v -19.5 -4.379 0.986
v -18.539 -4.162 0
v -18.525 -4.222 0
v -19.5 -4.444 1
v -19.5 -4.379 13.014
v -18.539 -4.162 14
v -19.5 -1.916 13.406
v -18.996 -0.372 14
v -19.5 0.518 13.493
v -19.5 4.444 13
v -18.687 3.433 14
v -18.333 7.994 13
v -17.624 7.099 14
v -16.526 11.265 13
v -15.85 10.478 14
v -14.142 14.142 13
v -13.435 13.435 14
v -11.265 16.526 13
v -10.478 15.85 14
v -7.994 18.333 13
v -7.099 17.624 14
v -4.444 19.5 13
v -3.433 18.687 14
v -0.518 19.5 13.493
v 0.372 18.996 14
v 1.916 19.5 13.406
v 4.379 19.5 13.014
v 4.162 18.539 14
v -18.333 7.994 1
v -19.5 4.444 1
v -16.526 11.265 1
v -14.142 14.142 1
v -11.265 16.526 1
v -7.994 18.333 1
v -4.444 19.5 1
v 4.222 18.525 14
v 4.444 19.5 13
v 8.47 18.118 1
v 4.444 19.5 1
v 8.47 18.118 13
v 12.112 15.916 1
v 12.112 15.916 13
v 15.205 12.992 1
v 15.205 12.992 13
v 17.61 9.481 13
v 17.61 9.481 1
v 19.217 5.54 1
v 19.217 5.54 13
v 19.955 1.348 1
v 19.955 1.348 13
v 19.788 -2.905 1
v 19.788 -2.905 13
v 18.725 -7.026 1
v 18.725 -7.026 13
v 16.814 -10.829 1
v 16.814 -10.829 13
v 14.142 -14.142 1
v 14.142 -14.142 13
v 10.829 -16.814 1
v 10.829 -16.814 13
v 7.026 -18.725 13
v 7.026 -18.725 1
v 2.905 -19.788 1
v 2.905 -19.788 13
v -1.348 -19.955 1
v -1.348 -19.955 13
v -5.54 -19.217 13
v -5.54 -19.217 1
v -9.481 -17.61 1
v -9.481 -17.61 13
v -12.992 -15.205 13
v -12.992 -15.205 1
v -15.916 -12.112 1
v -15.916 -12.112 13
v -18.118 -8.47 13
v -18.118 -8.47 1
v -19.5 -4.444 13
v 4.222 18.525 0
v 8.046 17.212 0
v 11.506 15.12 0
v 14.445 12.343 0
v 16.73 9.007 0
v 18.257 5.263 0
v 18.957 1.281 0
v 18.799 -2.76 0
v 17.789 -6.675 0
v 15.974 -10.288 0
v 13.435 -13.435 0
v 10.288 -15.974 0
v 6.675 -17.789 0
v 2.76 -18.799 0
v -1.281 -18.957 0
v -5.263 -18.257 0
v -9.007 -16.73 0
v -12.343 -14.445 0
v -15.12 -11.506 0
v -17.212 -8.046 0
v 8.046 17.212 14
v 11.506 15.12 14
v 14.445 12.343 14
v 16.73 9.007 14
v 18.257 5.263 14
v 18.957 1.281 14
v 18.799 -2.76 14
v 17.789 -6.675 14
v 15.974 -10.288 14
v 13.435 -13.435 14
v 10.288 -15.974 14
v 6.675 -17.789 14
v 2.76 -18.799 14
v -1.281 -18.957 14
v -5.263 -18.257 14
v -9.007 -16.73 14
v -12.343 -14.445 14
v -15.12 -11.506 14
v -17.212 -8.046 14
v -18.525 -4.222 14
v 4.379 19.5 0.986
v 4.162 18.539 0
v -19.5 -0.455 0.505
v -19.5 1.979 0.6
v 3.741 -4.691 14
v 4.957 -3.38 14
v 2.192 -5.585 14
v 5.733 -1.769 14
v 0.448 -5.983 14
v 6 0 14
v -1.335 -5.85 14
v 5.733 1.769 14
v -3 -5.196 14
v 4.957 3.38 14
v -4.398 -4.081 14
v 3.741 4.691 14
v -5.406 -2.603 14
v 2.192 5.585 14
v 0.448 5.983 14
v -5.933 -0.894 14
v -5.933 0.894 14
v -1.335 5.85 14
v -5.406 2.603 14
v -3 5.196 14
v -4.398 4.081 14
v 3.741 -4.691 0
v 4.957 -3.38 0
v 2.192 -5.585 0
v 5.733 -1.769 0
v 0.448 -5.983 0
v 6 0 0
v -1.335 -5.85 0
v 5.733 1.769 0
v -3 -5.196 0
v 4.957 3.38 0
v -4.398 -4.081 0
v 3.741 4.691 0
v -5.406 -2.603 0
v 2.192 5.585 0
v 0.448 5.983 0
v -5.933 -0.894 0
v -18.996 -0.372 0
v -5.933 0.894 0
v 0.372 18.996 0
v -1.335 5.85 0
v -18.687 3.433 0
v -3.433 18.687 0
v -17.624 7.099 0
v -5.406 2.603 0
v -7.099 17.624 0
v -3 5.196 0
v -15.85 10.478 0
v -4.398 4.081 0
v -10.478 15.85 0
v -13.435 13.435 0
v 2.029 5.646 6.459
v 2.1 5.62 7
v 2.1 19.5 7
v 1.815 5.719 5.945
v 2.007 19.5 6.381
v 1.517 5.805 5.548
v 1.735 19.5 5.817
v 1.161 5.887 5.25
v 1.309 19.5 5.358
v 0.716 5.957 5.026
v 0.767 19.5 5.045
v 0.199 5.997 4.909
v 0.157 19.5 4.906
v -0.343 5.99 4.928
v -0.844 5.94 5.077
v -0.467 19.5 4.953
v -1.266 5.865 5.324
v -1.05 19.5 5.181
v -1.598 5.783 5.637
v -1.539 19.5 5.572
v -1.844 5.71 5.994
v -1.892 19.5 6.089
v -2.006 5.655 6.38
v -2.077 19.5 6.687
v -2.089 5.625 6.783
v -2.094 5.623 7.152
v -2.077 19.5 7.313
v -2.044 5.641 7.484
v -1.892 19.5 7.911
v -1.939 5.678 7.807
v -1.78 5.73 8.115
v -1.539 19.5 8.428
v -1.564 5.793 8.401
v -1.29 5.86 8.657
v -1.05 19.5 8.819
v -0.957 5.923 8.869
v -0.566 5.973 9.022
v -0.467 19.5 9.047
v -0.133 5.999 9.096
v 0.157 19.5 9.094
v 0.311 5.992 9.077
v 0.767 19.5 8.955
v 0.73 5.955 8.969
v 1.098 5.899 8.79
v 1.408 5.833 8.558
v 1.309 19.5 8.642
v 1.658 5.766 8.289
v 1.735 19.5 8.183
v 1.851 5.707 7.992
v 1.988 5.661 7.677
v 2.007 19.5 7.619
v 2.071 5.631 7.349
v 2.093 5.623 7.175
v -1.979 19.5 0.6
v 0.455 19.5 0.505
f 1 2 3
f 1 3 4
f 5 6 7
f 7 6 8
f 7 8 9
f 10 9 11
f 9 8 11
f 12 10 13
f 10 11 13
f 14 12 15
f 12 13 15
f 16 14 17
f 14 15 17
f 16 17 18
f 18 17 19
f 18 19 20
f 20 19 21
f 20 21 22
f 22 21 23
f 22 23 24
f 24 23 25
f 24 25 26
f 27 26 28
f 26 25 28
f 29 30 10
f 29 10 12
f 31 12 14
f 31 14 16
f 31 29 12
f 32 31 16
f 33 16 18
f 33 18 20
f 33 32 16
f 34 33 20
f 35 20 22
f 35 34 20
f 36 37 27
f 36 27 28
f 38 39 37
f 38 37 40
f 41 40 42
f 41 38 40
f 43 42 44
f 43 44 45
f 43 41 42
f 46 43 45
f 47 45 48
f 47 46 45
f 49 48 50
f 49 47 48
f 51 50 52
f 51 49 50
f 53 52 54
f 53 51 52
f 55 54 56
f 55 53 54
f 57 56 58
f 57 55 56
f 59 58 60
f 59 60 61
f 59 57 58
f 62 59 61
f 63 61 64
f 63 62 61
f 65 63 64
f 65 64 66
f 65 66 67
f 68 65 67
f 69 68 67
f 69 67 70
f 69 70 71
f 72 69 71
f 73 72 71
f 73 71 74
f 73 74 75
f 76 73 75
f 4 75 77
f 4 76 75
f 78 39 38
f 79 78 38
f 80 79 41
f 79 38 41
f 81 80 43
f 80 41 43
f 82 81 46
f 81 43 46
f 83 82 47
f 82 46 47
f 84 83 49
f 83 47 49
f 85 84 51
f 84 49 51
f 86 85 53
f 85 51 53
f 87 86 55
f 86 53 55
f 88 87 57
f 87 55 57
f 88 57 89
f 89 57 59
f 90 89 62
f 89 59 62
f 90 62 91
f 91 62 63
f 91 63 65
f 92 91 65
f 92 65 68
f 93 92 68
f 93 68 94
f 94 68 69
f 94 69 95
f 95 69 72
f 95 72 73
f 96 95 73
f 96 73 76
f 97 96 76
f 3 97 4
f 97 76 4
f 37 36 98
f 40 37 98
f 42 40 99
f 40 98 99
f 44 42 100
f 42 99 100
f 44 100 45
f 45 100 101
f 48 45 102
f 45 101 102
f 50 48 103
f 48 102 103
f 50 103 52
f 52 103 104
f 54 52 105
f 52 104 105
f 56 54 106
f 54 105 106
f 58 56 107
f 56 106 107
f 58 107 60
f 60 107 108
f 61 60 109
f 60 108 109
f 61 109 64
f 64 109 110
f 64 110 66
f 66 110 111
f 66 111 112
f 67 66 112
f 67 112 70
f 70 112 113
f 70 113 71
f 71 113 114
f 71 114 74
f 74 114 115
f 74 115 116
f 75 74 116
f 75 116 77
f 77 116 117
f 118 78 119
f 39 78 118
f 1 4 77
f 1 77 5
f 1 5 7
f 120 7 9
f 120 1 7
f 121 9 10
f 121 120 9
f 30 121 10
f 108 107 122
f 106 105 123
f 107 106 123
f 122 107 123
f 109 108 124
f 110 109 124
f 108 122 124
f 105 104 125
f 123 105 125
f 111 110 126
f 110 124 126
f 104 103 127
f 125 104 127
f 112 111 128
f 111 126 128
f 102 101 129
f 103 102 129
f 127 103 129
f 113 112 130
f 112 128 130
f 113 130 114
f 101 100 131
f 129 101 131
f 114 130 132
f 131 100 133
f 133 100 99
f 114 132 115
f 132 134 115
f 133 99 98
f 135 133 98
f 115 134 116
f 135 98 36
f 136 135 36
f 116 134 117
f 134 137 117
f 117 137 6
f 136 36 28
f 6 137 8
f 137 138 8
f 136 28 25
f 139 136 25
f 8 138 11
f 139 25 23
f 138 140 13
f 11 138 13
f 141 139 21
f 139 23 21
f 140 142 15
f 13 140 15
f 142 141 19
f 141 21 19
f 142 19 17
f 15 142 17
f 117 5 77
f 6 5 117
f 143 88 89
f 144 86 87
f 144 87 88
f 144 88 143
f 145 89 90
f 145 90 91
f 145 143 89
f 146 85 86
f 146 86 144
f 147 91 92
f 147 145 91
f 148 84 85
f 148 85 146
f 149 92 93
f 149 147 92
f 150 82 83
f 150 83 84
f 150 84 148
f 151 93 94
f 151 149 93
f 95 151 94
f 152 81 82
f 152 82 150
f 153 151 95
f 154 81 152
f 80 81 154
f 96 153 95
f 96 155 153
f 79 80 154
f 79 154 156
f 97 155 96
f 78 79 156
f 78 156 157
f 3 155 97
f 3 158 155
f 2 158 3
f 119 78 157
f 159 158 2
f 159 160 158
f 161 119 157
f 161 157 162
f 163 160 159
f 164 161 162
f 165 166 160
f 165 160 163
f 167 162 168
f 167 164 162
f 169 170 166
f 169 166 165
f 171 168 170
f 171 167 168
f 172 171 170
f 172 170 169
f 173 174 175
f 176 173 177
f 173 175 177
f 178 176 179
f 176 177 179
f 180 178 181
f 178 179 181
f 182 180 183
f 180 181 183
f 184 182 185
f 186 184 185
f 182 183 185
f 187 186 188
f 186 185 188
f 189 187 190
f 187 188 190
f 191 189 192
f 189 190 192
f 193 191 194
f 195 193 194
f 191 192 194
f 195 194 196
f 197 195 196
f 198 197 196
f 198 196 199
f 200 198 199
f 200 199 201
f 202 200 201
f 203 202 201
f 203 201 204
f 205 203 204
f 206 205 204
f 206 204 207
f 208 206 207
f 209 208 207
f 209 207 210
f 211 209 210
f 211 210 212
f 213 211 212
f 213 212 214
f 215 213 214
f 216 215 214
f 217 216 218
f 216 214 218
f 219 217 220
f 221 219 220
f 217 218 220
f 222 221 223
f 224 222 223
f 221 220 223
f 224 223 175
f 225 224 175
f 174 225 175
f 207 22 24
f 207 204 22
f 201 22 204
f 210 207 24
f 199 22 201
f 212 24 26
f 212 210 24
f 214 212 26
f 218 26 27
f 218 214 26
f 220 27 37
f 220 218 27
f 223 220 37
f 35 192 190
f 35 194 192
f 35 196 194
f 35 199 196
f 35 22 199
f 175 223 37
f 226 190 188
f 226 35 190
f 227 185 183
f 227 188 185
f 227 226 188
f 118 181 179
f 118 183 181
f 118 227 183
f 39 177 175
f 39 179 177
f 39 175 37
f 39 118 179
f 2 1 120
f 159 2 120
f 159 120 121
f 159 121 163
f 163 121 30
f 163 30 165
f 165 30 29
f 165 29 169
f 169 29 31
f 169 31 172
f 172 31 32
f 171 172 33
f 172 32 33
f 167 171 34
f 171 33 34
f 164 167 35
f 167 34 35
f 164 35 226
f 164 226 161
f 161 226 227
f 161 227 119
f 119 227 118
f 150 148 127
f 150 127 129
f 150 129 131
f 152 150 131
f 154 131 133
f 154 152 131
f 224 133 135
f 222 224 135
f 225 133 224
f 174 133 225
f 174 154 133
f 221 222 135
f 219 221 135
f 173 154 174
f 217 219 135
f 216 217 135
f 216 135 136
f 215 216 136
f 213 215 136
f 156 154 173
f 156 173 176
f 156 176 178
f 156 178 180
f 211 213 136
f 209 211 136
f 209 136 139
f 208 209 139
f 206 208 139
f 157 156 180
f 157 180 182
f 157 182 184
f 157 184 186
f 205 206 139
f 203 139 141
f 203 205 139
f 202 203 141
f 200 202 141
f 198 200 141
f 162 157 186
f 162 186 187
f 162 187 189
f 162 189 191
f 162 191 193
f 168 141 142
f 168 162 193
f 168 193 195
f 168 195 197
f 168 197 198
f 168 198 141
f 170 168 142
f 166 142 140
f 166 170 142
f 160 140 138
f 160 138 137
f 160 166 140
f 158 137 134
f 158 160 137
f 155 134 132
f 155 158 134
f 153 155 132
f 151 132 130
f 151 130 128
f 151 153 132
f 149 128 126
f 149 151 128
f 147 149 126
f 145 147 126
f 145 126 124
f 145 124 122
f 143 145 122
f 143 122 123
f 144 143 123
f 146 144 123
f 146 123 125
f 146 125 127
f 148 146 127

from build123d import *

# Parameters (mm, degrees)
SKETCH1_R              = 6
BOSS_EXTRUDE1_DEPTH    = 14
M5_TAPPED_HOLE1_REACH  = 48.435
M5_TAPPED_HOLE1_BORE_R = 2.1
CHAMFER1_SIZE          = 1


with BuildPart() as part:
    # Sketch1 → Boss-Extrude1 (new body)
    with BuildSketch(Plane.XY):
        with BuildLine():
            Line((-4.444097209, 19.5), (4.444097209, 19.5))
            ThreePointArc((4.444097209, 19.5), (14.142135624, -14.142135624), (-19.5, -4.444097209))
            Line((-19.5, -4.444097209), (-19.5, 4.444097209))
            ThreePointArc((-19.5, 4.444097209), (-14.142135624, 14.142135624), (-4.444097209, 19.5))
        make_face()
        Circle(SKETCH1_R, mode=Mode.SUBTRACT)
    extrude(amount=BOSS_EXTRUDE1_DEPTH)

    # M5 Tapped Hole1 bore → M5 Tapped Hole1 (cut, up to next)
    with BuildSketch(Plane(origin=(0, 19.5, 0), x_dir=(1, 0, 0), z_dir=(0, 1, 0)), mode=Mode.PRIVATE) as m5_tapped_hole1_sk1:
        with Locations((0, -7)):
            Circle(M5_TAPPED_HOLE1_BORE_R)
    m5_tapped_hole1_tool1 = extrude(m5_tapped_hole1_sk1.sketch, amount=-M5_TAPPED_HOLE1_REACH, mode=Mode.PRIVATE) & part.part
    add(m5_tapped_hole1_tool1.solids().sort_by_distance((0, 19.5, 7))[0], mode=Mode.SUBTRACT)

    # Chamfer1
    chamfer1_edges = [part.edges().sort_by_distance(p)[0] for p in [
        (14.142135624, -14.142135624, 0),
    ]]
    chamfer(chamfer1_edges, length=CHAMFER1_SIZE)
    chamfer1_2_edges = [part.edges().sort_by_distance(p)[0] for p in [
        (14.142135624, -14.142135624, 14),
    ]]
    chamfer(chamfer1_2_edges, length=CHAMFER1_SIZE)
    chamfer1_3_edges = [part.edges().sort_by_distance(p)[0] for p in [
        (-14.142135624, 14.142135624, 0),
    ]]
    chamfer(chamfer1_3_edges, length=CHAMFER1_SIZE - 0.0001)  # a hair under: the kernel refuses the full size
    chamfer1_4_edges = [part.edges().sort_by_distance(p)[0] for p in [
        (-14.142135624, 14.142135624, 14),
    ]]
    chamfer(chamfer1_4_edges, length=CHAMFER1_SIZE - 0.0001)  # a hair under: the kernel refuses the full size


solid = part.part
